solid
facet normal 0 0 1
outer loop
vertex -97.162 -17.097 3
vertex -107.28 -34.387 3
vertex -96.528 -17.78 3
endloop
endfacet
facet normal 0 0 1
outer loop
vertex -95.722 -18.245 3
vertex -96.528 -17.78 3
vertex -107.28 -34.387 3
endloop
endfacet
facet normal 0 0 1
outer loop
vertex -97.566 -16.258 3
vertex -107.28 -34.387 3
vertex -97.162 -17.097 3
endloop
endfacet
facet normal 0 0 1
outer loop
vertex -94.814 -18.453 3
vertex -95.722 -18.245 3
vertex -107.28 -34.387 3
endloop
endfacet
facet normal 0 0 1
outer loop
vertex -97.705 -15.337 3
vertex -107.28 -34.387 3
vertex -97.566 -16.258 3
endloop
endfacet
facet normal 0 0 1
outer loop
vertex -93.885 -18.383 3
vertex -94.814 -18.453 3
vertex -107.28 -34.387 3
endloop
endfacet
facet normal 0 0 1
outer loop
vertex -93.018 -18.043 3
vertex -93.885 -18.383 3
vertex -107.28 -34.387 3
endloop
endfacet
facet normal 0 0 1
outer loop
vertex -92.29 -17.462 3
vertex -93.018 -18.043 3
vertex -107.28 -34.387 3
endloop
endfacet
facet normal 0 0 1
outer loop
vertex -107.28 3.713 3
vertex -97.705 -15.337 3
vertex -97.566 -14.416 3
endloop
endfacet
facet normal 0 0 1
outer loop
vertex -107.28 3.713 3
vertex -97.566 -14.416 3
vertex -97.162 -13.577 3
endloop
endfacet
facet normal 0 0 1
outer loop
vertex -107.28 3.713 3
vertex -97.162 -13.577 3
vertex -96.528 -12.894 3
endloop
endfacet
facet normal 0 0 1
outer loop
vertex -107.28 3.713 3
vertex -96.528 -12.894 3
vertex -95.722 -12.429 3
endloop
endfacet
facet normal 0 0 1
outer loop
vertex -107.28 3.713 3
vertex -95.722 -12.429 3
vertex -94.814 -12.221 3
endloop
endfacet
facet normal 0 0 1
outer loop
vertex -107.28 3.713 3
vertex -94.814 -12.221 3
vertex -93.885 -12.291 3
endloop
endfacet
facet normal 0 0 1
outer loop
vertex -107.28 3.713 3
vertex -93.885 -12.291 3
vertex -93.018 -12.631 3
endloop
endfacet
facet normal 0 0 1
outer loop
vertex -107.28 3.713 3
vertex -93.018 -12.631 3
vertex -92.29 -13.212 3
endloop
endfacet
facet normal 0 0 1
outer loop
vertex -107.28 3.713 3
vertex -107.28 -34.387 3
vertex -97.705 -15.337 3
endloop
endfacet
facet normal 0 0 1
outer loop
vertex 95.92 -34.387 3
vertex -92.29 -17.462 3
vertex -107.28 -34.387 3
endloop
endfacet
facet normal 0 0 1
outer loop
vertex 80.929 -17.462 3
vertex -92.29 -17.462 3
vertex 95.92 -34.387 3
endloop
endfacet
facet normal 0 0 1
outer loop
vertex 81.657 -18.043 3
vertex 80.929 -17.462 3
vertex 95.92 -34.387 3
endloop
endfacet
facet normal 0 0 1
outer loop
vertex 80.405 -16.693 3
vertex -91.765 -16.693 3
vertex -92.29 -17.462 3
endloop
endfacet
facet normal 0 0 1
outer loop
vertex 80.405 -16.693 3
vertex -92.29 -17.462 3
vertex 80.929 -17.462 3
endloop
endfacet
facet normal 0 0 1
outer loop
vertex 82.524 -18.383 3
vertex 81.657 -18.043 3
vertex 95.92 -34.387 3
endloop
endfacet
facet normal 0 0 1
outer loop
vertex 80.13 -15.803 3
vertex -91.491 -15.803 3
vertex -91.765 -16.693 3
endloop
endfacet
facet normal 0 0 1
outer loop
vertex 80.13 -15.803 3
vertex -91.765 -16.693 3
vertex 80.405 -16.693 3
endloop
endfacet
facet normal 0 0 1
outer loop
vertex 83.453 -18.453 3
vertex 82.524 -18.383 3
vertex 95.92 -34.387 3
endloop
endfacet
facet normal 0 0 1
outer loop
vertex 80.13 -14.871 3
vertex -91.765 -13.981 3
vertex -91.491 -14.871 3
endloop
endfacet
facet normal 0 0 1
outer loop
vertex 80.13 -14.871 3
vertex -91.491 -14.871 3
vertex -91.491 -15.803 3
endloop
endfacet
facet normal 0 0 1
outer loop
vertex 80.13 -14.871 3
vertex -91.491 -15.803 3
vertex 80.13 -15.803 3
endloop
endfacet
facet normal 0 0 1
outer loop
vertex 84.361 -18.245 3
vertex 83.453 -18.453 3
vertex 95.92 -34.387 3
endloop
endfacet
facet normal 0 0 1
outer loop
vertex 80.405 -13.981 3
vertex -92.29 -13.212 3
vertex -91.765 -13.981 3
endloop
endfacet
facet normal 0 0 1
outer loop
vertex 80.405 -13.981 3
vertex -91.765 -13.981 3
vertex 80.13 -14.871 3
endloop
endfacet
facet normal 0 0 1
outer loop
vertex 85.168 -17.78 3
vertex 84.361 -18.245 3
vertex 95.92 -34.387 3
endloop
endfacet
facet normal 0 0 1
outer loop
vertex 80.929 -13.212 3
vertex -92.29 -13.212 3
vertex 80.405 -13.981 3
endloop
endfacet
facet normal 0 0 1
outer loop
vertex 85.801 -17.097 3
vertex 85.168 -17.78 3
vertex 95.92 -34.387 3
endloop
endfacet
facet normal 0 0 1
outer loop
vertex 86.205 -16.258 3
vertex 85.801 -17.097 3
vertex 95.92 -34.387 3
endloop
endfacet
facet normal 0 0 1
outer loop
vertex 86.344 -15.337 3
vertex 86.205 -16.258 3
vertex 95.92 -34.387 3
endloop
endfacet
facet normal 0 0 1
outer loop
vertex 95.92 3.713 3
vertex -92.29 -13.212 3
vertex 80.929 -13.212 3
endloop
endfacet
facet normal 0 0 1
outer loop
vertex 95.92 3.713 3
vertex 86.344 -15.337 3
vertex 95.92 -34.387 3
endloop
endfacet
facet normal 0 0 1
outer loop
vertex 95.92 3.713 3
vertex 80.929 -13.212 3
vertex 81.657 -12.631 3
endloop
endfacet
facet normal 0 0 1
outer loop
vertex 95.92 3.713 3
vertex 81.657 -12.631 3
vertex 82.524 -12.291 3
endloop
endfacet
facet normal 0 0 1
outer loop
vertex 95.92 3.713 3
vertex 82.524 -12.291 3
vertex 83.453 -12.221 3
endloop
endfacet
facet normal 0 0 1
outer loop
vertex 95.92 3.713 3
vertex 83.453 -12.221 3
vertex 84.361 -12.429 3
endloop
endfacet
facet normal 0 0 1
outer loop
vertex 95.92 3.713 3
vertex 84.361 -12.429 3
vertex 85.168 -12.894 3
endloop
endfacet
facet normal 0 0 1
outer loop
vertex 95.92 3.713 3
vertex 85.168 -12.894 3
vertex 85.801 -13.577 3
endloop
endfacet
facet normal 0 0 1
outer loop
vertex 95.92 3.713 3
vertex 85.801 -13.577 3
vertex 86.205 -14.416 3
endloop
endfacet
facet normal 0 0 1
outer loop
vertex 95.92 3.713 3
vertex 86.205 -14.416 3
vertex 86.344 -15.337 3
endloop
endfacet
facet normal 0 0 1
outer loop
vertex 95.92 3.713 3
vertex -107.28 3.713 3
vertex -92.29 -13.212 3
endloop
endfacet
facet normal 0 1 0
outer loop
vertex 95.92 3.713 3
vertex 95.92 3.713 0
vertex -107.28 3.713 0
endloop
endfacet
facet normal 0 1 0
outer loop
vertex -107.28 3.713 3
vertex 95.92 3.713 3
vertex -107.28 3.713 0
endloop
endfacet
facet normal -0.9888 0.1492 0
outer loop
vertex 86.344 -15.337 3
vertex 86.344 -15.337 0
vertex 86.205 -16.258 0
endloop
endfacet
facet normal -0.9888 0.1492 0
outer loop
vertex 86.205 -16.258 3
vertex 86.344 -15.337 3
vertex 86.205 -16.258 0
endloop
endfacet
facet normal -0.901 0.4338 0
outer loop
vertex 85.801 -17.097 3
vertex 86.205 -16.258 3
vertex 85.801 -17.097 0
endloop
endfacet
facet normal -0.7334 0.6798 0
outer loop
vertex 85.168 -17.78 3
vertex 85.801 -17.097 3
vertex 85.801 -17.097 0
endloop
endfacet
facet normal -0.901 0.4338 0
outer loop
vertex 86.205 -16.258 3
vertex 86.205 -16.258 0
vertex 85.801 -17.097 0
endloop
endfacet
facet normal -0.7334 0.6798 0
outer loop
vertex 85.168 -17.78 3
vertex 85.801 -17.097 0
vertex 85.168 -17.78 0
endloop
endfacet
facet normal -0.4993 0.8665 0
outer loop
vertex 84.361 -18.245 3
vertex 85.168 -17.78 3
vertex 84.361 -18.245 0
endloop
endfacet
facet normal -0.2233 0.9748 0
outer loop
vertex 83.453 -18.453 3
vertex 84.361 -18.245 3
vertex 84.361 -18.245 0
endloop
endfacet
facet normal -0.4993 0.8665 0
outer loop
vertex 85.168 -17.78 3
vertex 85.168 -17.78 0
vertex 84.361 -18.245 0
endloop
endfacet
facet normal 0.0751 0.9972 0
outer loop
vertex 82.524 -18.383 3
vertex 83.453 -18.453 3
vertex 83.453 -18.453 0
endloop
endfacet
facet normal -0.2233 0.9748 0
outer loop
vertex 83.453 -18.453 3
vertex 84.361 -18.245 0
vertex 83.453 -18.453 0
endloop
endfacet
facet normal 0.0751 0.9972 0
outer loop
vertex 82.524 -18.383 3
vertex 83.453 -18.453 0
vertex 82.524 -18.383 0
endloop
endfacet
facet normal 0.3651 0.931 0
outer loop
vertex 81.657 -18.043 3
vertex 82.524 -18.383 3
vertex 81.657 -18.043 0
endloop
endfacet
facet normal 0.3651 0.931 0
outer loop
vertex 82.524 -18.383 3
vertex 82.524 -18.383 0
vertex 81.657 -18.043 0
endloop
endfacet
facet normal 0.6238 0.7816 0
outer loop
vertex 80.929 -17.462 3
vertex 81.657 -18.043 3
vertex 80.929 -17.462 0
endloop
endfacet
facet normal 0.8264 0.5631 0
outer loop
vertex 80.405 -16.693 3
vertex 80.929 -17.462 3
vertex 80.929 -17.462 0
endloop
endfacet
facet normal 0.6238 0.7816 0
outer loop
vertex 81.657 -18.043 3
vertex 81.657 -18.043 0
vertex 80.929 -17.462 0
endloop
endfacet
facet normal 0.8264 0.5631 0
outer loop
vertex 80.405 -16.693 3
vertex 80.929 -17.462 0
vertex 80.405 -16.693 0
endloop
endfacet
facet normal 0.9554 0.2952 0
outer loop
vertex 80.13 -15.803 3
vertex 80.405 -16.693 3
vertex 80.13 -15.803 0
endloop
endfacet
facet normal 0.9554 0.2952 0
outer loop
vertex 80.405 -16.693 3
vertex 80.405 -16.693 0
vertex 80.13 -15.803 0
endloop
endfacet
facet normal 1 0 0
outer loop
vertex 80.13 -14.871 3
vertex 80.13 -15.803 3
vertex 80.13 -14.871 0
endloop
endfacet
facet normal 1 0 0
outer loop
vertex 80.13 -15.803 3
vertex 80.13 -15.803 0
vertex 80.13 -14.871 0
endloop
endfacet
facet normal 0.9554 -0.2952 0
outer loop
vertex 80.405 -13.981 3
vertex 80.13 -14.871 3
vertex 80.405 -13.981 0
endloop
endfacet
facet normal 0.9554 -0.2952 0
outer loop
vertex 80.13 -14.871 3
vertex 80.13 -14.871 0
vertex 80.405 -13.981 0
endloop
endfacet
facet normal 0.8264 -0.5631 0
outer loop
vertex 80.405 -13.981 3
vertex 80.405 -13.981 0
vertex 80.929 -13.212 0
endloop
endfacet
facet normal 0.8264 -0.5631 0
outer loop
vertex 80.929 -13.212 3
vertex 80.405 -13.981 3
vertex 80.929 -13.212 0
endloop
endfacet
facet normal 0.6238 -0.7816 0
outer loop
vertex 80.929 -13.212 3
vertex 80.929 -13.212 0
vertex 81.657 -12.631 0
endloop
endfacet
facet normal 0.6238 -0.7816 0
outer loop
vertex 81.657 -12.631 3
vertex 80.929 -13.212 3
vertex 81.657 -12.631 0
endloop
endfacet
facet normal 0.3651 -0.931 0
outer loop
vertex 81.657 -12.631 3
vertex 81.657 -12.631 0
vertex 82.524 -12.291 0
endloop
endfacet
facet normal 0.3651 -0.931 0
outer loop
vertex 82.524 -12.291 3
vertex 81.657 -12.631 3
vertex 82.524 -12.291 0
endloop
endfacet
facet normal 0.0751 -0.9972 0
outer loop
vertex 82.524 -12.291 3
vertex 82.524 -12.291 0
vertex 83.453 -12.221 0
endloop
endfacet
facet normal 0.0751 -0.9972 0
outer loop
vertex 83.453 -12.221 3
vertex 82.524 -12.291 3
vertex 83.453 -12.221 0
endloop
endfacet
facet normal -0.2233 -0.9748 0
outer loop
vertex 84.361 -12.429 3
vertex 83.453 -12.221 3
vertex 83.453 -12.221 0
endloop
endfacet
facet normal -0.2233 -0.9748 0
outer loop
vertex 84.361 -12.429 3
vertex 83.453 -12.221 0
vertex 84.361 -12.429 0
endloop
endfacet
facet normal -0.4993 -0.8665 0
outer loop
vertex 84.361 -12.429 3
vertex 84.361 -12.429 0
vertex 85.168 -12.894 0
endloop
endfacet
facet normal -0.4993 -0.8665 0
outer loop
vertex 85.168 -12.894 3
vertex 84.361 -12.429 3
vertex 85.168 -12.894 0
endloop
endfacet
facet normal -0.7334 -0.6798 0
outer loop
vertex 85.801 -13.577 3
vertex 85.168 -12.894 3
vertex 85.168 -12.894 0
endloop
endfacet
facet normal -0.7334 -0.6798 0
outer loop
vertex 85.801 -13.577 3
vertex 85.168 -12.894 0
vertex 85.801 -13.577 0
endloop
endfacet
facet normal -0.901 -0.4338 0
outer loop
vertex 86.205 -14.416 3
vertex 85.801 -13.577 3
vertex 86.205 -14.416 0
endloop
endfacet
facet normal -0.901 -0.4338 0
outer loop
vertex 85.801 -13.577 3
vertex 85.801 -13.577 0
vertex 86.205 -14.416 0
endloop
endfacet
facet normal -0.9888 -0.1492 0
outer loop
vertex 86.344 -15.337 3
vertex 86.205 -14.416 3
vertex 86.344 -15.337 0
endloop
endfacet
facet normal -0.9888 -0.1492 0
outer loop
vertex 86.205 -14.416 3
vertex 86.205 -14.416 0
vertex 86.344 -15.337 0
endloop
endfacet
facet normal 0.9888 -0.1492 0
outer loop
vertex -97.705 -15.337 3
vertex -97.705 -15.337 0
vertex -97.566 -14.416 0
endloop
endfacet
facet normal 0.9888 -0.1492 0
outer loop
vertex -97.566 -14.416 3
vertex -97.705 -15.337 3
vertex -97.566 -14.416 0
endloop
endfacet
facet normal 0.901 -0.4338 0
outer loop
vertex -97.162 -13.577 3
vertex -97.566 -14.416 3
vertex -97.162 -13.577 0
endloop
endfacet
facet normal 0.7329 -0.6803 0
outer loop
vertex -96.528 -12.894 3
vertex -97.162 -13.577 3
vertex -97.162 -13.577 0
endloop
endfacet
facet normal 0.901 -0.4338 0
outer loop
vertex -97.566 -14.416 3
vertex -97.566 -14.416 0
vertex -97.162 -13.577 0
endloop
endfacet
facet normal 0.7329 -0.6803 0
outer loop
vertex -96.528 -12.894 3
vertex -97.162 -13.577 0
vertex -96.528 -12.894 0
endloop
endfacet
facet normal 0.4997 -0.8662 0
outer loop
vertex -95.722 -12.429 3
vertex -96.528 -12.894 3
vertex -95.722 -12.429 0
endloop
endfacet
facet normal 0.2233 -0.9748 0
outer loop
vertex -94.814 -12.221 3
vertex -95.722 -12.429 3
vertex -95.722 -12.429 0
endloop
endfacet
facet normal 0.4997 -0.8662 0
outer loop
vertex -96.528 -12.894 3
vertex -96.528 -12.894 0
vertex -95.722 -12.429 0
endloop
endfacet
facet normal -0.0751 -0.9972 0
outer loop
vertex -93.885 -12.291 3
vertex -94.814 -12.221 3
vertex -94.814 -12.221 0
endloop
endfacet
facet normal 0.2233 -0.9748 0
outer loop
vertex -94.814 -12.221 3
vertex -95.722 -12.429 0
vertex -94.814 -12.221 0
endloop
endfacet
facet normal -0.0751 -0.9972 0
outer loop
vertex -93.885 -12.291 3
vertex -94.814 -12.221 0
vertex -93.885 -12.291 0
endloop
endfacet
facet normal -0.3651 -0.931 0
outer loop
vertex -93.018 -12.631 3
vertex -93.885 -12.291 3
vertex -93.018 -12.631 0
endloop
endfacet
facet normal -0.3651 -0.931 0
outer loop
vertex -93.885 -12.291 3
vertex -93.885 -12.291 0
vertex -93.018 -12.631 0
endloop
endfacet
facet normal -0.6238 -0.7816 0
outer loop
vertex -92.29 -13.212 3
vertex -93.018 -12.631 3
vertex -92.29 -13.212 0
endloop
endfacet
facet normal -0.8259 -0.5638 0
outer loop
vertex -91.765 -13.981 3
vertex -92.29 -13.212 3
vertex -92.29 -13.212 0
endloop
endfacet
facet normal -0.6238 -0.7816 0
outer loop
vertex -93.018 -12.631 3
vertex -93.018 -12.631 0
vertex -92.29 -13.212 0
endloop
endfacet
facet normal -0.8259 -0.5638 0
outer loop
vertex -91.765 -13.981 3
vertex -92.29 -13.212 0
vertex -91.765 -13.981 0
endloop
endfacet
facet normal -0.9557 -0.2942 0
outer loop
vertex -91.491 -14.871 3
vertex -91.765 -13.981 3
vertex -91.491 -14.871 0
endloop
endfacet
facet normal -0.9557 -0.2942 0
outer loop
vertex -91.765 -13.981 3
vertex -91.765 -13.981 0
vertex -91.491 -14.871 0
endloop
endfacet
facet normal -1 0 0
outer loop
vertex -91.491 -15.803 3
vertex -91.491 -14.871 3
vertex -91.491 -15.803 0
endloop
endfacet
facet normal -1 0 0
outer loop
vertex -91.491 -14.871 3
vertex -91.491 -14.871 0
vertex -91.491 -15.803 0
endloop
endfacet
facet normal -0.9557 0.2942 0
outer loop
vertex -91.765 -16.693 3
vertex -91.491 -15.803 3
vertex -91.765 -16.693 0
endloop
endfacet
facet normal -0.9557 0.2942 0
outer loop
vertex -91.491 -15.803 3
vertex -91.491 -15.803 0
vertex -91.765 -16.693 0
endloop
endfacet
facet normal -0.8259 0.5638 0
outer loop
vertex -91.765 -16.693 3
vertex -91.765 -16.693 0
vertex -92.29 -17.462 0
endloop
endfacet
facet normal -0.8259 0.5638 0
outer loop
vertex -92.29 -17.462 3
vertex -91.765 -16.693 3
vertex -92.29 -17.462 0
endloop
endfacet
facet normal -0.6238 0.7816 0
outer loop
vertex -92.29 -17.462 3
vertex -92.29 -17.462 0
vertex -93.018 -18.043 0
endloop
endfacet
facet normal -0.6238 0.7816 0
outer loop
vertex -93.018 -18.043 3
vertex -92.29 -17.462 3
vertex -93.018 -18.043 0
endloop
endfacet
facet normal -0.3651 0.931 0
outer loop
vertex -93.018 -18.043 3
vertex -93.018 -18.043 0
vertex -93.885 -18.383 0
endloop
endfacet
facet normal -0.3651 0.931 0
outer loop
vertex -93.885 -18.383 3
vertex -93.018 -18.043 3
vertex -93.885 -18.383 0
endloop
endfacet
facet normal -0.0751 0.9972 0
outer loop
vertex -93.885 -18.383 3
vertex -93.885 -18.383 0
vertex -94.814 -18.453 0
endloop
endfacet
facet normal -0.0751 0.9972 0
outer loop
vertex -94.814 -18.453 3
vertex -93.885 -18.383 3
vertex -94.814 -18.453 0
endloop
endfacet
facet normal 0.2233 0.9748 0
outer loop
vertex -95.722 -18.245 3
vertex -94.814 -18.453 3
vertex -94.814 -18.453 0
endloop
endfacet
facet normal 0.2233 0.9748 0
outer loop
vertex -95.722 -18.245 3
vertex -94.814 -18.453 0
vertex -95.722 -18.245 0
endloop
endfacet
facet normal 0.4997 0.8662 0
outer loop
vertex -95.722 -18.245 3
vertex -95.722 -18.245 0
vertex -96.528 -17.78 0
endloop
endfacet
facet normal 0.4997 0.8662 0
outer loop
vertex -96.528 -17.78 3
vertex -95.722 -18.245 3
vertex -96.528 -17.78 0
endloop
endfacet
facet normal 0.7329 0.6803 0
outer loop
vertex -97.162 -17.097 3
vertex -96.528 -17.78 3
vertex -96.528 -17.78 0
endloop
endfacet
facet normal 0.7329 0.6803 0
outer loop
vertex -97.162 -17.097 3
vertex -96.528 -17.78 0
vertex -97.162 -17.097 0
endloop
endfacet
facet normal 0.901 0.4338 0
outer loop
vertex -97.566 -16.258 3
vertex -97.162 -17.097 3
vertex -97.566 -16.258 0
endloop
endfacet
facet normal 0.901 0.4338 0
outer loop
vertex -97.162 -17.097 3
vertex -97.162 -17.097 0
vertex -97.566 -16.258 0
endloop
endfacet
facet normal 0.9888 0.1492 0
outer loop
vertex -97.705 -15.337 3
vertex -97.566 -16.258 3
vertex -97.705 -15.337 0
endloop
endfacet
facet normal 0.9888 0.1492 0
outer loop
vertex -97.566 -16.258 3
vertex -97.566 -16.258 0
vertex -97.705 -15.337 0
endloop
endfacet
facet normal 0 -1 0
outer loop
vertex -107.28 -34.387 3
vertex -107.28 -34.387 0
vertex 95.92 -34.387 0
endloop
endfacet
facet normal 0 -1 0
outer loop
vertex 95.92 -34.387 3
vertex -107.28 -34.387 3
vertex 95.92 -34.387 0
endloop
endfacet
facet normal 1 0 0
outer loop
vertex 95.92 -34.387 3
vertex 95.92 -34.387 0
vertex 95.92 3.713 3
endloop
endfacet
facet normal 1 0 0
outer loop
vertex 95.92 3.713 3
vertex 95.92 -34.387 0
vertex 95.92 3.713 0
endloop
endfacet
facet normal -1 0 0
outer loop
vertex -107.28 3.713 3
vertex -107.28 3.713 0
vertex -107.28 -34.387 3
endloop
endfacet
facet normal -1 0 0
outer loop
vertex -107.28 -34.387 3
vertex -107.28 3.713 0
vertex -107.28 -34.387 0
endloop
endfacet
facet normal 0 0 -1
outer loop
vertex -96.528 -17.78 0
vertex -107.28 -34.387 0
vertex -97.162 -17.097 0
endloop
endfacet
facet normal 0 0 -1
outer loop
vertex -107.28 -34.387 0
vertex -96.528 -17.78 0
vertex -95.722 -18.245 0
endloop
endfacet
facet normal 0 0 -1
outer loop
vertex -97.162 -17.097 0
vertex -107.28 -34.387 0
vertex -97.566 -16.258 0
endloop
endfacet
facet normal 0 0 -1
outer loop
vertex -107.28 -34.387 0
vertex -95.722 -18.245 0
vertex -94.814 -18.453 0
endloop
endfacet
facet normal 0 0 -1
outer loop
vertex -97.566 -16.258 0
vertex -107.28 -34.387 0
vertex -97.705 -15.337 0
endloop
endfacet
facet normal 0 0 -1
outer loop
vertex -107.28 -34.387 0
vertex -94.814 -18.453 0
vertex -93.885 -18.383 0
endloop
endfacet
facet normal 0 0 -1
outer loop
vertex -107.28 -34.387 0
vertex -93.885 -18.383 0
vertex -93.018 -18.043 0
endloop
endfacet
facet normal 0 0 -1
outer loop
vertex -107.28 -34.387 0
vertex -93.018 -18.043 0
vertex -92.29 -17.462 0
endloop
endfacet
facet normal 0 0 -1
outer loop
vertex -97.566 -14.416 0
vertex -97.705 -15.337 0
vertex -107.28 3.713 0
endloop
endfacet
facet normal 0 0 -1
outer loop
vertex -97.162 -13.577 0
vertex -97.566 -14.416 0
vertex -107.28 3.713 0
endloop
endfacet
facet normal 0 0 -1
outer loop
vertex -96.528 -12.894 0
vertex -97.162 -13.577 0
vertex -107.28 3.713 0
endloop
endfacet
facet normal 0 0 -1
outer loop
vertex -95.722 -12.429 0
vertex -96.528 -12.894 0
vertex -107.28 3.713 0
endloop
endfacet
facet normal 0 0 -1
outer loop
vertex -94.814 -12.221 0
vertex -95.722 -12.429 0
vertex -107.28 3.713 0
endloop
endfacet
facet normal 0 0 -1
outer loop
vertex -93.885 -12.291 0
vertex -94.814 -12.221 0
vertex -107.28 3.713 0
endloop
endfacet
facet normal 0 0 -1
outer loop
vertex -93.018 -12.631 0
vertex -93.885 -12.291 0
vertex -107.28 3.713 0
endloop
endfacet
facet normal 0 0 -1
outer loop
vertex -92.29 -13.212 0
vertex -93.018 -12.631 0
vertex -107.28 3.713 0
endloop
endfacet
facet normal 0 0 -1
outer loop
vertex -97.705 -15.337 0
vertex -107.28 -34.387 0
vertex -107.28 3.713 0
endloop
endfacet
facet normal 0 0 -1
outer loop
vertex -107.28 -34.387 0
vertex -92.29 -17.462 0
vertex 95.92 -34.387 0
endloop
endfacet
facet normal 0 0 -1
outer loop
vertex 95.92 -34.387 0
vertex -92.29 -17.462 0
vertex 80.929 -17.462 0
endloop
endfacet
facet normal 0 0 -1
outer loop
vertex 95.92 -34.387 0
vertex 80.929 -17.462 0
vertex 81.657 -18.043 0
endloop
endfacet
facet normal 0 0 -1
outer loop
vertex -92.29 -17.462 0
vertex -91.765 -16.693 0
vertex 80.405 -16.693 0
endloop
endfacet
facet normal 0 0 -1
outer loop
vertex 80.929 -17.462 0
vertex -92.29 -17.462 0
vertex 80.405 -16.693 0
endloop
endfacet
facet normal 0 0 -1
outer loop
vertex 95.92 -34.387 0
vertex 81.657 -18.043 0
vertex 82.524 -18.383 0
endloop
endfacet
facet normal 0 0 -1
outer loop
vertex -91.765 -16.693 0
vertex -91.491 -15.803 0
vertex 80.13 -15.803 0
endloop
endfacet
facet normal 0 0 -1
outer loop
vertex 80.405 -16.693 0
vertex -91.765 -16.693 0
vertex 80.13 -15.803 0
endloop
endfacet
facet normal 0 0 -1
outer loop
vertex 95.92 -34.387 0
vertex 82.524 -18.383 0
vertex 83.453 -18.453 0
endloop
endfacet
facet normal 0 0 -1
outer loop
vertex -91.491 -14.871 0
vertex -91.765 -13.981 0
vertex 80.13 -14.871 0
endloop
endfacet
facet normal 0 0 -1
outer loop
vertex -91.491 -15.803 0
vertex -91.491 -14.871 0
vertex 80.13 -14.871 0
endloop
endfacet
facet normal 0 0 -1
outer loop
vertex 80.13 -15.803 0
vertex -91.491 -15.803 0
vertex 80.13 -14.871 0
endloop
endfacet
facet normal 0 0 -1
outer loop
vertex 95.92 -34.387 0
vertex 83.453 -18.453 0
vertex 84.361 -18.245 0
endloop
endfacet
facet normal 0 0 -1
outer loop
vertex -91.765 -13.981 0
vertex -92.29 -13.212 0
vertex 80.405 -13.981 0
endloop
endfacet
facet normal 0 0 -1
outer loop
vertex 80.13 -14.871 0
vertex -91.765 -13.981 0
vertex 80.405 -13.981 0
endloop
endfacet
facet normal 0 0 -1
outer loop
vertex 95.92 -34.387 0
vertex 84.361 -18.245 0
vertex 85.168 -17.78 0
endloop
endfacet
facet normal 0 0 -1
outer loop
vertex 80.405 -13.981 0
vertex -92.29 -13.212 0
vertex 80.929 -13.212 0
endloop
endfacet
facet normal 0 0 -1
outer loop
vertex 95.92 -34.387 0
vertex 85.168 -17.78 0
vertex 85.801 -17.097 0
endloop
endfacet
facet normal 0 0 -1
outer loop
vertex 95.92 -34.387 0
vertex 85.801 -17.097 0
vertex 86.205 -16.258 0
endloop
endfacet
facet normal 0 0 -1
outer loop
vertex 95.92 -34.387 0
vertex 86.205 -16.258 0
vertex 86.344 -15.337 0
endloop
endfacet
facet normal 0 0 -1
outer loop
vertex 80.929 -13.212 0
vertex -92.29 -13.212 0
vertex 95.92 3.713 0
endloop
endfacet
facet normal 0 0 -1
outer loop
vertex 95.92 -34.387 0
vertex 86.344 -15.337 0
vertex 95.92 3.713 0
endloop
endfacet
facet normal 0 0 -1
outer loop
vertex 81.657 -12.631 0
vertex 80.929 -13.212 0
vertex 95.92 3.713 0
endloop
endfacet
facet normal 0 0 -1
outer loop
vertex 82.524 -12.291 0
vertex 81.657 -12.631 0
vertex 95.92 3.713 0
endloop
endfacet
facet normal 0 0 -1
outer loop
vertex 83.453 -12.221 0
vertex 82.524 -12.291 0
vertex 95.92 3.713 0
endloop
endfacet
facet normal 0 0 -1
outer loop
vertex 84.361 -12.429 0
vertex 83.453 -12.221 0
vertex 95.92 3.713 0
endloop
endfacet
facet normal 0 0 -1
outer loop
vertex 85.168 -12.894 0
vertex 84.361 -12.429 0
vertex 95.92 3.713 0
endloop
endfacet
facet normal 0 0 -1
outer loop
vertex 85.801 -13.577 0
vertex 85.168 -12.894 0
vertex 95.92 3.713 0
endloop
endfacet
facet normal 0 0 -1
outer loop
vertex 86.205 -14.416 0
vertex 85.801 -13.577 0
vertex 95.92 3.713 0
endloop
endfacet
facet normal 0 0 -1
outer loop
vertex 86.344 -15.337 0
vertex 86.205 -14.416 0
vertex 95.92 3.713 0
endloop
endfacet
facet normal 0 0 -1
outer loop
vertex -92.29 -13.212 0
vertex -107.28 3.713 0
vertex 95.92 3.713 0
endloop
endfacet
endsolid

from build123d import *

# Parameters (mm, degrees)
F1_DEPTH = 3


with BuildPart() as f1:
    # F0 (on Top) → F1 (new body)
    with BuildSketch(Plane.XY):
        with BuildLine():
            Line((95.9196680397, 3.7129714398), (-5.6803319603, 3.7129714398))
            Line((-5.6803319603, 3.7129714398), (-5.6803319603, -15.3370285602))
            Line((-5.6803319603, -15.3370285602), (45.1196680397, -15.3370285602))
            Line((45.1196680397, -15.3370285602), (70.5196680397, -15.3370285602))
            Line((70.5196680397, -15.3370285602), (80.0952486641, -15.3370285602))
            ThreePointArc((80.0952486641, -15.3370285602), (83.2196680397, -12.2126091846), (86.3440874153, -15.3370285602))
            Line((86.3440874153, -15.3370285602), (95.9196680397, -15.3370285602))
            Line((95.9196680397, -15.3370285602), (95.9196680397, 3.7129714398))
        make_face()
        with BuildLine():
            Line((-97.7047513359, -15.3370285602), (-107.2803319603, -15.3370285602))
            Line((-107.2803319603, -15.3370285602), (-107.2803319603, -34.3870285602))
            Line((-107.2803319603, -34.3870285602), (-5.6803319603, -34.3870285602))
            Line((-5.6803319603, -34.3870285602), (-5.6803319603, -15.3370285602))
            Line((-5.6803319603, -15.3370285602), (-91.4559125847, -15.3370285602))
            ThreePointArc((-91.4559125847, -15.3370285602), (-94.5803319603, -18.4614479358), (-97.7047513359, -15.3370285602))
        make_face()
        with BuildLine():
            Line((45.1196680397, -15.3370285602), (-5.6803319603, -15.3370285602))
            Line((-5.6803319603, -15.3370285602), (-5.6803319603, -34.3870285602))
            Line((-5.6803319603, -34.3870285602), (95.9196680397, -34.3870285602))
            Line((95.9196680397, -34.3870285602), (95.9196680397, -15.3370285602))
            Line((95.9196680397, -15.3370285602), (86.3440874153, -15.3370285602))
            ThreePointArc((86.3440874153, -15.3370285602), (83.2196680397, -18.4614479358), (80.0952486641, -15.3370285602))
            Line((80.0952486641, -15.3370285602), (70.5196680397, -15.3370285602))
            Line((70.5196680397, -15.3370285602), (45.1196680397, -15.3370285602))
        make_face()
        with BuildLine():
            Line((-5.6803319603, 3.7129714398), (-107.2803319603, 3.7129714398))
            Line((-107.2803319603, 3.7129714398), (-107.2803319603, -15.3370285602))
            Line((-107.2803319603, -15.3370285602), (-97.7047513359, -15.3370285602))
            ThreePointArc((-97.7047513359, -15.3370285602), (-94.5803319603, -12.2126091846), (-91.4559125847, -15.3370285602))
            Line((-91.4559125847, -15.3370285602), (-5.6803319603, -15.3370285602))
            Line((-5.6803319603, -15.3370285602), (-5.6803319603, 3.7129714398))
        make_face()
    extrude(amount=F1_DEPTH)


solid = f1.part
